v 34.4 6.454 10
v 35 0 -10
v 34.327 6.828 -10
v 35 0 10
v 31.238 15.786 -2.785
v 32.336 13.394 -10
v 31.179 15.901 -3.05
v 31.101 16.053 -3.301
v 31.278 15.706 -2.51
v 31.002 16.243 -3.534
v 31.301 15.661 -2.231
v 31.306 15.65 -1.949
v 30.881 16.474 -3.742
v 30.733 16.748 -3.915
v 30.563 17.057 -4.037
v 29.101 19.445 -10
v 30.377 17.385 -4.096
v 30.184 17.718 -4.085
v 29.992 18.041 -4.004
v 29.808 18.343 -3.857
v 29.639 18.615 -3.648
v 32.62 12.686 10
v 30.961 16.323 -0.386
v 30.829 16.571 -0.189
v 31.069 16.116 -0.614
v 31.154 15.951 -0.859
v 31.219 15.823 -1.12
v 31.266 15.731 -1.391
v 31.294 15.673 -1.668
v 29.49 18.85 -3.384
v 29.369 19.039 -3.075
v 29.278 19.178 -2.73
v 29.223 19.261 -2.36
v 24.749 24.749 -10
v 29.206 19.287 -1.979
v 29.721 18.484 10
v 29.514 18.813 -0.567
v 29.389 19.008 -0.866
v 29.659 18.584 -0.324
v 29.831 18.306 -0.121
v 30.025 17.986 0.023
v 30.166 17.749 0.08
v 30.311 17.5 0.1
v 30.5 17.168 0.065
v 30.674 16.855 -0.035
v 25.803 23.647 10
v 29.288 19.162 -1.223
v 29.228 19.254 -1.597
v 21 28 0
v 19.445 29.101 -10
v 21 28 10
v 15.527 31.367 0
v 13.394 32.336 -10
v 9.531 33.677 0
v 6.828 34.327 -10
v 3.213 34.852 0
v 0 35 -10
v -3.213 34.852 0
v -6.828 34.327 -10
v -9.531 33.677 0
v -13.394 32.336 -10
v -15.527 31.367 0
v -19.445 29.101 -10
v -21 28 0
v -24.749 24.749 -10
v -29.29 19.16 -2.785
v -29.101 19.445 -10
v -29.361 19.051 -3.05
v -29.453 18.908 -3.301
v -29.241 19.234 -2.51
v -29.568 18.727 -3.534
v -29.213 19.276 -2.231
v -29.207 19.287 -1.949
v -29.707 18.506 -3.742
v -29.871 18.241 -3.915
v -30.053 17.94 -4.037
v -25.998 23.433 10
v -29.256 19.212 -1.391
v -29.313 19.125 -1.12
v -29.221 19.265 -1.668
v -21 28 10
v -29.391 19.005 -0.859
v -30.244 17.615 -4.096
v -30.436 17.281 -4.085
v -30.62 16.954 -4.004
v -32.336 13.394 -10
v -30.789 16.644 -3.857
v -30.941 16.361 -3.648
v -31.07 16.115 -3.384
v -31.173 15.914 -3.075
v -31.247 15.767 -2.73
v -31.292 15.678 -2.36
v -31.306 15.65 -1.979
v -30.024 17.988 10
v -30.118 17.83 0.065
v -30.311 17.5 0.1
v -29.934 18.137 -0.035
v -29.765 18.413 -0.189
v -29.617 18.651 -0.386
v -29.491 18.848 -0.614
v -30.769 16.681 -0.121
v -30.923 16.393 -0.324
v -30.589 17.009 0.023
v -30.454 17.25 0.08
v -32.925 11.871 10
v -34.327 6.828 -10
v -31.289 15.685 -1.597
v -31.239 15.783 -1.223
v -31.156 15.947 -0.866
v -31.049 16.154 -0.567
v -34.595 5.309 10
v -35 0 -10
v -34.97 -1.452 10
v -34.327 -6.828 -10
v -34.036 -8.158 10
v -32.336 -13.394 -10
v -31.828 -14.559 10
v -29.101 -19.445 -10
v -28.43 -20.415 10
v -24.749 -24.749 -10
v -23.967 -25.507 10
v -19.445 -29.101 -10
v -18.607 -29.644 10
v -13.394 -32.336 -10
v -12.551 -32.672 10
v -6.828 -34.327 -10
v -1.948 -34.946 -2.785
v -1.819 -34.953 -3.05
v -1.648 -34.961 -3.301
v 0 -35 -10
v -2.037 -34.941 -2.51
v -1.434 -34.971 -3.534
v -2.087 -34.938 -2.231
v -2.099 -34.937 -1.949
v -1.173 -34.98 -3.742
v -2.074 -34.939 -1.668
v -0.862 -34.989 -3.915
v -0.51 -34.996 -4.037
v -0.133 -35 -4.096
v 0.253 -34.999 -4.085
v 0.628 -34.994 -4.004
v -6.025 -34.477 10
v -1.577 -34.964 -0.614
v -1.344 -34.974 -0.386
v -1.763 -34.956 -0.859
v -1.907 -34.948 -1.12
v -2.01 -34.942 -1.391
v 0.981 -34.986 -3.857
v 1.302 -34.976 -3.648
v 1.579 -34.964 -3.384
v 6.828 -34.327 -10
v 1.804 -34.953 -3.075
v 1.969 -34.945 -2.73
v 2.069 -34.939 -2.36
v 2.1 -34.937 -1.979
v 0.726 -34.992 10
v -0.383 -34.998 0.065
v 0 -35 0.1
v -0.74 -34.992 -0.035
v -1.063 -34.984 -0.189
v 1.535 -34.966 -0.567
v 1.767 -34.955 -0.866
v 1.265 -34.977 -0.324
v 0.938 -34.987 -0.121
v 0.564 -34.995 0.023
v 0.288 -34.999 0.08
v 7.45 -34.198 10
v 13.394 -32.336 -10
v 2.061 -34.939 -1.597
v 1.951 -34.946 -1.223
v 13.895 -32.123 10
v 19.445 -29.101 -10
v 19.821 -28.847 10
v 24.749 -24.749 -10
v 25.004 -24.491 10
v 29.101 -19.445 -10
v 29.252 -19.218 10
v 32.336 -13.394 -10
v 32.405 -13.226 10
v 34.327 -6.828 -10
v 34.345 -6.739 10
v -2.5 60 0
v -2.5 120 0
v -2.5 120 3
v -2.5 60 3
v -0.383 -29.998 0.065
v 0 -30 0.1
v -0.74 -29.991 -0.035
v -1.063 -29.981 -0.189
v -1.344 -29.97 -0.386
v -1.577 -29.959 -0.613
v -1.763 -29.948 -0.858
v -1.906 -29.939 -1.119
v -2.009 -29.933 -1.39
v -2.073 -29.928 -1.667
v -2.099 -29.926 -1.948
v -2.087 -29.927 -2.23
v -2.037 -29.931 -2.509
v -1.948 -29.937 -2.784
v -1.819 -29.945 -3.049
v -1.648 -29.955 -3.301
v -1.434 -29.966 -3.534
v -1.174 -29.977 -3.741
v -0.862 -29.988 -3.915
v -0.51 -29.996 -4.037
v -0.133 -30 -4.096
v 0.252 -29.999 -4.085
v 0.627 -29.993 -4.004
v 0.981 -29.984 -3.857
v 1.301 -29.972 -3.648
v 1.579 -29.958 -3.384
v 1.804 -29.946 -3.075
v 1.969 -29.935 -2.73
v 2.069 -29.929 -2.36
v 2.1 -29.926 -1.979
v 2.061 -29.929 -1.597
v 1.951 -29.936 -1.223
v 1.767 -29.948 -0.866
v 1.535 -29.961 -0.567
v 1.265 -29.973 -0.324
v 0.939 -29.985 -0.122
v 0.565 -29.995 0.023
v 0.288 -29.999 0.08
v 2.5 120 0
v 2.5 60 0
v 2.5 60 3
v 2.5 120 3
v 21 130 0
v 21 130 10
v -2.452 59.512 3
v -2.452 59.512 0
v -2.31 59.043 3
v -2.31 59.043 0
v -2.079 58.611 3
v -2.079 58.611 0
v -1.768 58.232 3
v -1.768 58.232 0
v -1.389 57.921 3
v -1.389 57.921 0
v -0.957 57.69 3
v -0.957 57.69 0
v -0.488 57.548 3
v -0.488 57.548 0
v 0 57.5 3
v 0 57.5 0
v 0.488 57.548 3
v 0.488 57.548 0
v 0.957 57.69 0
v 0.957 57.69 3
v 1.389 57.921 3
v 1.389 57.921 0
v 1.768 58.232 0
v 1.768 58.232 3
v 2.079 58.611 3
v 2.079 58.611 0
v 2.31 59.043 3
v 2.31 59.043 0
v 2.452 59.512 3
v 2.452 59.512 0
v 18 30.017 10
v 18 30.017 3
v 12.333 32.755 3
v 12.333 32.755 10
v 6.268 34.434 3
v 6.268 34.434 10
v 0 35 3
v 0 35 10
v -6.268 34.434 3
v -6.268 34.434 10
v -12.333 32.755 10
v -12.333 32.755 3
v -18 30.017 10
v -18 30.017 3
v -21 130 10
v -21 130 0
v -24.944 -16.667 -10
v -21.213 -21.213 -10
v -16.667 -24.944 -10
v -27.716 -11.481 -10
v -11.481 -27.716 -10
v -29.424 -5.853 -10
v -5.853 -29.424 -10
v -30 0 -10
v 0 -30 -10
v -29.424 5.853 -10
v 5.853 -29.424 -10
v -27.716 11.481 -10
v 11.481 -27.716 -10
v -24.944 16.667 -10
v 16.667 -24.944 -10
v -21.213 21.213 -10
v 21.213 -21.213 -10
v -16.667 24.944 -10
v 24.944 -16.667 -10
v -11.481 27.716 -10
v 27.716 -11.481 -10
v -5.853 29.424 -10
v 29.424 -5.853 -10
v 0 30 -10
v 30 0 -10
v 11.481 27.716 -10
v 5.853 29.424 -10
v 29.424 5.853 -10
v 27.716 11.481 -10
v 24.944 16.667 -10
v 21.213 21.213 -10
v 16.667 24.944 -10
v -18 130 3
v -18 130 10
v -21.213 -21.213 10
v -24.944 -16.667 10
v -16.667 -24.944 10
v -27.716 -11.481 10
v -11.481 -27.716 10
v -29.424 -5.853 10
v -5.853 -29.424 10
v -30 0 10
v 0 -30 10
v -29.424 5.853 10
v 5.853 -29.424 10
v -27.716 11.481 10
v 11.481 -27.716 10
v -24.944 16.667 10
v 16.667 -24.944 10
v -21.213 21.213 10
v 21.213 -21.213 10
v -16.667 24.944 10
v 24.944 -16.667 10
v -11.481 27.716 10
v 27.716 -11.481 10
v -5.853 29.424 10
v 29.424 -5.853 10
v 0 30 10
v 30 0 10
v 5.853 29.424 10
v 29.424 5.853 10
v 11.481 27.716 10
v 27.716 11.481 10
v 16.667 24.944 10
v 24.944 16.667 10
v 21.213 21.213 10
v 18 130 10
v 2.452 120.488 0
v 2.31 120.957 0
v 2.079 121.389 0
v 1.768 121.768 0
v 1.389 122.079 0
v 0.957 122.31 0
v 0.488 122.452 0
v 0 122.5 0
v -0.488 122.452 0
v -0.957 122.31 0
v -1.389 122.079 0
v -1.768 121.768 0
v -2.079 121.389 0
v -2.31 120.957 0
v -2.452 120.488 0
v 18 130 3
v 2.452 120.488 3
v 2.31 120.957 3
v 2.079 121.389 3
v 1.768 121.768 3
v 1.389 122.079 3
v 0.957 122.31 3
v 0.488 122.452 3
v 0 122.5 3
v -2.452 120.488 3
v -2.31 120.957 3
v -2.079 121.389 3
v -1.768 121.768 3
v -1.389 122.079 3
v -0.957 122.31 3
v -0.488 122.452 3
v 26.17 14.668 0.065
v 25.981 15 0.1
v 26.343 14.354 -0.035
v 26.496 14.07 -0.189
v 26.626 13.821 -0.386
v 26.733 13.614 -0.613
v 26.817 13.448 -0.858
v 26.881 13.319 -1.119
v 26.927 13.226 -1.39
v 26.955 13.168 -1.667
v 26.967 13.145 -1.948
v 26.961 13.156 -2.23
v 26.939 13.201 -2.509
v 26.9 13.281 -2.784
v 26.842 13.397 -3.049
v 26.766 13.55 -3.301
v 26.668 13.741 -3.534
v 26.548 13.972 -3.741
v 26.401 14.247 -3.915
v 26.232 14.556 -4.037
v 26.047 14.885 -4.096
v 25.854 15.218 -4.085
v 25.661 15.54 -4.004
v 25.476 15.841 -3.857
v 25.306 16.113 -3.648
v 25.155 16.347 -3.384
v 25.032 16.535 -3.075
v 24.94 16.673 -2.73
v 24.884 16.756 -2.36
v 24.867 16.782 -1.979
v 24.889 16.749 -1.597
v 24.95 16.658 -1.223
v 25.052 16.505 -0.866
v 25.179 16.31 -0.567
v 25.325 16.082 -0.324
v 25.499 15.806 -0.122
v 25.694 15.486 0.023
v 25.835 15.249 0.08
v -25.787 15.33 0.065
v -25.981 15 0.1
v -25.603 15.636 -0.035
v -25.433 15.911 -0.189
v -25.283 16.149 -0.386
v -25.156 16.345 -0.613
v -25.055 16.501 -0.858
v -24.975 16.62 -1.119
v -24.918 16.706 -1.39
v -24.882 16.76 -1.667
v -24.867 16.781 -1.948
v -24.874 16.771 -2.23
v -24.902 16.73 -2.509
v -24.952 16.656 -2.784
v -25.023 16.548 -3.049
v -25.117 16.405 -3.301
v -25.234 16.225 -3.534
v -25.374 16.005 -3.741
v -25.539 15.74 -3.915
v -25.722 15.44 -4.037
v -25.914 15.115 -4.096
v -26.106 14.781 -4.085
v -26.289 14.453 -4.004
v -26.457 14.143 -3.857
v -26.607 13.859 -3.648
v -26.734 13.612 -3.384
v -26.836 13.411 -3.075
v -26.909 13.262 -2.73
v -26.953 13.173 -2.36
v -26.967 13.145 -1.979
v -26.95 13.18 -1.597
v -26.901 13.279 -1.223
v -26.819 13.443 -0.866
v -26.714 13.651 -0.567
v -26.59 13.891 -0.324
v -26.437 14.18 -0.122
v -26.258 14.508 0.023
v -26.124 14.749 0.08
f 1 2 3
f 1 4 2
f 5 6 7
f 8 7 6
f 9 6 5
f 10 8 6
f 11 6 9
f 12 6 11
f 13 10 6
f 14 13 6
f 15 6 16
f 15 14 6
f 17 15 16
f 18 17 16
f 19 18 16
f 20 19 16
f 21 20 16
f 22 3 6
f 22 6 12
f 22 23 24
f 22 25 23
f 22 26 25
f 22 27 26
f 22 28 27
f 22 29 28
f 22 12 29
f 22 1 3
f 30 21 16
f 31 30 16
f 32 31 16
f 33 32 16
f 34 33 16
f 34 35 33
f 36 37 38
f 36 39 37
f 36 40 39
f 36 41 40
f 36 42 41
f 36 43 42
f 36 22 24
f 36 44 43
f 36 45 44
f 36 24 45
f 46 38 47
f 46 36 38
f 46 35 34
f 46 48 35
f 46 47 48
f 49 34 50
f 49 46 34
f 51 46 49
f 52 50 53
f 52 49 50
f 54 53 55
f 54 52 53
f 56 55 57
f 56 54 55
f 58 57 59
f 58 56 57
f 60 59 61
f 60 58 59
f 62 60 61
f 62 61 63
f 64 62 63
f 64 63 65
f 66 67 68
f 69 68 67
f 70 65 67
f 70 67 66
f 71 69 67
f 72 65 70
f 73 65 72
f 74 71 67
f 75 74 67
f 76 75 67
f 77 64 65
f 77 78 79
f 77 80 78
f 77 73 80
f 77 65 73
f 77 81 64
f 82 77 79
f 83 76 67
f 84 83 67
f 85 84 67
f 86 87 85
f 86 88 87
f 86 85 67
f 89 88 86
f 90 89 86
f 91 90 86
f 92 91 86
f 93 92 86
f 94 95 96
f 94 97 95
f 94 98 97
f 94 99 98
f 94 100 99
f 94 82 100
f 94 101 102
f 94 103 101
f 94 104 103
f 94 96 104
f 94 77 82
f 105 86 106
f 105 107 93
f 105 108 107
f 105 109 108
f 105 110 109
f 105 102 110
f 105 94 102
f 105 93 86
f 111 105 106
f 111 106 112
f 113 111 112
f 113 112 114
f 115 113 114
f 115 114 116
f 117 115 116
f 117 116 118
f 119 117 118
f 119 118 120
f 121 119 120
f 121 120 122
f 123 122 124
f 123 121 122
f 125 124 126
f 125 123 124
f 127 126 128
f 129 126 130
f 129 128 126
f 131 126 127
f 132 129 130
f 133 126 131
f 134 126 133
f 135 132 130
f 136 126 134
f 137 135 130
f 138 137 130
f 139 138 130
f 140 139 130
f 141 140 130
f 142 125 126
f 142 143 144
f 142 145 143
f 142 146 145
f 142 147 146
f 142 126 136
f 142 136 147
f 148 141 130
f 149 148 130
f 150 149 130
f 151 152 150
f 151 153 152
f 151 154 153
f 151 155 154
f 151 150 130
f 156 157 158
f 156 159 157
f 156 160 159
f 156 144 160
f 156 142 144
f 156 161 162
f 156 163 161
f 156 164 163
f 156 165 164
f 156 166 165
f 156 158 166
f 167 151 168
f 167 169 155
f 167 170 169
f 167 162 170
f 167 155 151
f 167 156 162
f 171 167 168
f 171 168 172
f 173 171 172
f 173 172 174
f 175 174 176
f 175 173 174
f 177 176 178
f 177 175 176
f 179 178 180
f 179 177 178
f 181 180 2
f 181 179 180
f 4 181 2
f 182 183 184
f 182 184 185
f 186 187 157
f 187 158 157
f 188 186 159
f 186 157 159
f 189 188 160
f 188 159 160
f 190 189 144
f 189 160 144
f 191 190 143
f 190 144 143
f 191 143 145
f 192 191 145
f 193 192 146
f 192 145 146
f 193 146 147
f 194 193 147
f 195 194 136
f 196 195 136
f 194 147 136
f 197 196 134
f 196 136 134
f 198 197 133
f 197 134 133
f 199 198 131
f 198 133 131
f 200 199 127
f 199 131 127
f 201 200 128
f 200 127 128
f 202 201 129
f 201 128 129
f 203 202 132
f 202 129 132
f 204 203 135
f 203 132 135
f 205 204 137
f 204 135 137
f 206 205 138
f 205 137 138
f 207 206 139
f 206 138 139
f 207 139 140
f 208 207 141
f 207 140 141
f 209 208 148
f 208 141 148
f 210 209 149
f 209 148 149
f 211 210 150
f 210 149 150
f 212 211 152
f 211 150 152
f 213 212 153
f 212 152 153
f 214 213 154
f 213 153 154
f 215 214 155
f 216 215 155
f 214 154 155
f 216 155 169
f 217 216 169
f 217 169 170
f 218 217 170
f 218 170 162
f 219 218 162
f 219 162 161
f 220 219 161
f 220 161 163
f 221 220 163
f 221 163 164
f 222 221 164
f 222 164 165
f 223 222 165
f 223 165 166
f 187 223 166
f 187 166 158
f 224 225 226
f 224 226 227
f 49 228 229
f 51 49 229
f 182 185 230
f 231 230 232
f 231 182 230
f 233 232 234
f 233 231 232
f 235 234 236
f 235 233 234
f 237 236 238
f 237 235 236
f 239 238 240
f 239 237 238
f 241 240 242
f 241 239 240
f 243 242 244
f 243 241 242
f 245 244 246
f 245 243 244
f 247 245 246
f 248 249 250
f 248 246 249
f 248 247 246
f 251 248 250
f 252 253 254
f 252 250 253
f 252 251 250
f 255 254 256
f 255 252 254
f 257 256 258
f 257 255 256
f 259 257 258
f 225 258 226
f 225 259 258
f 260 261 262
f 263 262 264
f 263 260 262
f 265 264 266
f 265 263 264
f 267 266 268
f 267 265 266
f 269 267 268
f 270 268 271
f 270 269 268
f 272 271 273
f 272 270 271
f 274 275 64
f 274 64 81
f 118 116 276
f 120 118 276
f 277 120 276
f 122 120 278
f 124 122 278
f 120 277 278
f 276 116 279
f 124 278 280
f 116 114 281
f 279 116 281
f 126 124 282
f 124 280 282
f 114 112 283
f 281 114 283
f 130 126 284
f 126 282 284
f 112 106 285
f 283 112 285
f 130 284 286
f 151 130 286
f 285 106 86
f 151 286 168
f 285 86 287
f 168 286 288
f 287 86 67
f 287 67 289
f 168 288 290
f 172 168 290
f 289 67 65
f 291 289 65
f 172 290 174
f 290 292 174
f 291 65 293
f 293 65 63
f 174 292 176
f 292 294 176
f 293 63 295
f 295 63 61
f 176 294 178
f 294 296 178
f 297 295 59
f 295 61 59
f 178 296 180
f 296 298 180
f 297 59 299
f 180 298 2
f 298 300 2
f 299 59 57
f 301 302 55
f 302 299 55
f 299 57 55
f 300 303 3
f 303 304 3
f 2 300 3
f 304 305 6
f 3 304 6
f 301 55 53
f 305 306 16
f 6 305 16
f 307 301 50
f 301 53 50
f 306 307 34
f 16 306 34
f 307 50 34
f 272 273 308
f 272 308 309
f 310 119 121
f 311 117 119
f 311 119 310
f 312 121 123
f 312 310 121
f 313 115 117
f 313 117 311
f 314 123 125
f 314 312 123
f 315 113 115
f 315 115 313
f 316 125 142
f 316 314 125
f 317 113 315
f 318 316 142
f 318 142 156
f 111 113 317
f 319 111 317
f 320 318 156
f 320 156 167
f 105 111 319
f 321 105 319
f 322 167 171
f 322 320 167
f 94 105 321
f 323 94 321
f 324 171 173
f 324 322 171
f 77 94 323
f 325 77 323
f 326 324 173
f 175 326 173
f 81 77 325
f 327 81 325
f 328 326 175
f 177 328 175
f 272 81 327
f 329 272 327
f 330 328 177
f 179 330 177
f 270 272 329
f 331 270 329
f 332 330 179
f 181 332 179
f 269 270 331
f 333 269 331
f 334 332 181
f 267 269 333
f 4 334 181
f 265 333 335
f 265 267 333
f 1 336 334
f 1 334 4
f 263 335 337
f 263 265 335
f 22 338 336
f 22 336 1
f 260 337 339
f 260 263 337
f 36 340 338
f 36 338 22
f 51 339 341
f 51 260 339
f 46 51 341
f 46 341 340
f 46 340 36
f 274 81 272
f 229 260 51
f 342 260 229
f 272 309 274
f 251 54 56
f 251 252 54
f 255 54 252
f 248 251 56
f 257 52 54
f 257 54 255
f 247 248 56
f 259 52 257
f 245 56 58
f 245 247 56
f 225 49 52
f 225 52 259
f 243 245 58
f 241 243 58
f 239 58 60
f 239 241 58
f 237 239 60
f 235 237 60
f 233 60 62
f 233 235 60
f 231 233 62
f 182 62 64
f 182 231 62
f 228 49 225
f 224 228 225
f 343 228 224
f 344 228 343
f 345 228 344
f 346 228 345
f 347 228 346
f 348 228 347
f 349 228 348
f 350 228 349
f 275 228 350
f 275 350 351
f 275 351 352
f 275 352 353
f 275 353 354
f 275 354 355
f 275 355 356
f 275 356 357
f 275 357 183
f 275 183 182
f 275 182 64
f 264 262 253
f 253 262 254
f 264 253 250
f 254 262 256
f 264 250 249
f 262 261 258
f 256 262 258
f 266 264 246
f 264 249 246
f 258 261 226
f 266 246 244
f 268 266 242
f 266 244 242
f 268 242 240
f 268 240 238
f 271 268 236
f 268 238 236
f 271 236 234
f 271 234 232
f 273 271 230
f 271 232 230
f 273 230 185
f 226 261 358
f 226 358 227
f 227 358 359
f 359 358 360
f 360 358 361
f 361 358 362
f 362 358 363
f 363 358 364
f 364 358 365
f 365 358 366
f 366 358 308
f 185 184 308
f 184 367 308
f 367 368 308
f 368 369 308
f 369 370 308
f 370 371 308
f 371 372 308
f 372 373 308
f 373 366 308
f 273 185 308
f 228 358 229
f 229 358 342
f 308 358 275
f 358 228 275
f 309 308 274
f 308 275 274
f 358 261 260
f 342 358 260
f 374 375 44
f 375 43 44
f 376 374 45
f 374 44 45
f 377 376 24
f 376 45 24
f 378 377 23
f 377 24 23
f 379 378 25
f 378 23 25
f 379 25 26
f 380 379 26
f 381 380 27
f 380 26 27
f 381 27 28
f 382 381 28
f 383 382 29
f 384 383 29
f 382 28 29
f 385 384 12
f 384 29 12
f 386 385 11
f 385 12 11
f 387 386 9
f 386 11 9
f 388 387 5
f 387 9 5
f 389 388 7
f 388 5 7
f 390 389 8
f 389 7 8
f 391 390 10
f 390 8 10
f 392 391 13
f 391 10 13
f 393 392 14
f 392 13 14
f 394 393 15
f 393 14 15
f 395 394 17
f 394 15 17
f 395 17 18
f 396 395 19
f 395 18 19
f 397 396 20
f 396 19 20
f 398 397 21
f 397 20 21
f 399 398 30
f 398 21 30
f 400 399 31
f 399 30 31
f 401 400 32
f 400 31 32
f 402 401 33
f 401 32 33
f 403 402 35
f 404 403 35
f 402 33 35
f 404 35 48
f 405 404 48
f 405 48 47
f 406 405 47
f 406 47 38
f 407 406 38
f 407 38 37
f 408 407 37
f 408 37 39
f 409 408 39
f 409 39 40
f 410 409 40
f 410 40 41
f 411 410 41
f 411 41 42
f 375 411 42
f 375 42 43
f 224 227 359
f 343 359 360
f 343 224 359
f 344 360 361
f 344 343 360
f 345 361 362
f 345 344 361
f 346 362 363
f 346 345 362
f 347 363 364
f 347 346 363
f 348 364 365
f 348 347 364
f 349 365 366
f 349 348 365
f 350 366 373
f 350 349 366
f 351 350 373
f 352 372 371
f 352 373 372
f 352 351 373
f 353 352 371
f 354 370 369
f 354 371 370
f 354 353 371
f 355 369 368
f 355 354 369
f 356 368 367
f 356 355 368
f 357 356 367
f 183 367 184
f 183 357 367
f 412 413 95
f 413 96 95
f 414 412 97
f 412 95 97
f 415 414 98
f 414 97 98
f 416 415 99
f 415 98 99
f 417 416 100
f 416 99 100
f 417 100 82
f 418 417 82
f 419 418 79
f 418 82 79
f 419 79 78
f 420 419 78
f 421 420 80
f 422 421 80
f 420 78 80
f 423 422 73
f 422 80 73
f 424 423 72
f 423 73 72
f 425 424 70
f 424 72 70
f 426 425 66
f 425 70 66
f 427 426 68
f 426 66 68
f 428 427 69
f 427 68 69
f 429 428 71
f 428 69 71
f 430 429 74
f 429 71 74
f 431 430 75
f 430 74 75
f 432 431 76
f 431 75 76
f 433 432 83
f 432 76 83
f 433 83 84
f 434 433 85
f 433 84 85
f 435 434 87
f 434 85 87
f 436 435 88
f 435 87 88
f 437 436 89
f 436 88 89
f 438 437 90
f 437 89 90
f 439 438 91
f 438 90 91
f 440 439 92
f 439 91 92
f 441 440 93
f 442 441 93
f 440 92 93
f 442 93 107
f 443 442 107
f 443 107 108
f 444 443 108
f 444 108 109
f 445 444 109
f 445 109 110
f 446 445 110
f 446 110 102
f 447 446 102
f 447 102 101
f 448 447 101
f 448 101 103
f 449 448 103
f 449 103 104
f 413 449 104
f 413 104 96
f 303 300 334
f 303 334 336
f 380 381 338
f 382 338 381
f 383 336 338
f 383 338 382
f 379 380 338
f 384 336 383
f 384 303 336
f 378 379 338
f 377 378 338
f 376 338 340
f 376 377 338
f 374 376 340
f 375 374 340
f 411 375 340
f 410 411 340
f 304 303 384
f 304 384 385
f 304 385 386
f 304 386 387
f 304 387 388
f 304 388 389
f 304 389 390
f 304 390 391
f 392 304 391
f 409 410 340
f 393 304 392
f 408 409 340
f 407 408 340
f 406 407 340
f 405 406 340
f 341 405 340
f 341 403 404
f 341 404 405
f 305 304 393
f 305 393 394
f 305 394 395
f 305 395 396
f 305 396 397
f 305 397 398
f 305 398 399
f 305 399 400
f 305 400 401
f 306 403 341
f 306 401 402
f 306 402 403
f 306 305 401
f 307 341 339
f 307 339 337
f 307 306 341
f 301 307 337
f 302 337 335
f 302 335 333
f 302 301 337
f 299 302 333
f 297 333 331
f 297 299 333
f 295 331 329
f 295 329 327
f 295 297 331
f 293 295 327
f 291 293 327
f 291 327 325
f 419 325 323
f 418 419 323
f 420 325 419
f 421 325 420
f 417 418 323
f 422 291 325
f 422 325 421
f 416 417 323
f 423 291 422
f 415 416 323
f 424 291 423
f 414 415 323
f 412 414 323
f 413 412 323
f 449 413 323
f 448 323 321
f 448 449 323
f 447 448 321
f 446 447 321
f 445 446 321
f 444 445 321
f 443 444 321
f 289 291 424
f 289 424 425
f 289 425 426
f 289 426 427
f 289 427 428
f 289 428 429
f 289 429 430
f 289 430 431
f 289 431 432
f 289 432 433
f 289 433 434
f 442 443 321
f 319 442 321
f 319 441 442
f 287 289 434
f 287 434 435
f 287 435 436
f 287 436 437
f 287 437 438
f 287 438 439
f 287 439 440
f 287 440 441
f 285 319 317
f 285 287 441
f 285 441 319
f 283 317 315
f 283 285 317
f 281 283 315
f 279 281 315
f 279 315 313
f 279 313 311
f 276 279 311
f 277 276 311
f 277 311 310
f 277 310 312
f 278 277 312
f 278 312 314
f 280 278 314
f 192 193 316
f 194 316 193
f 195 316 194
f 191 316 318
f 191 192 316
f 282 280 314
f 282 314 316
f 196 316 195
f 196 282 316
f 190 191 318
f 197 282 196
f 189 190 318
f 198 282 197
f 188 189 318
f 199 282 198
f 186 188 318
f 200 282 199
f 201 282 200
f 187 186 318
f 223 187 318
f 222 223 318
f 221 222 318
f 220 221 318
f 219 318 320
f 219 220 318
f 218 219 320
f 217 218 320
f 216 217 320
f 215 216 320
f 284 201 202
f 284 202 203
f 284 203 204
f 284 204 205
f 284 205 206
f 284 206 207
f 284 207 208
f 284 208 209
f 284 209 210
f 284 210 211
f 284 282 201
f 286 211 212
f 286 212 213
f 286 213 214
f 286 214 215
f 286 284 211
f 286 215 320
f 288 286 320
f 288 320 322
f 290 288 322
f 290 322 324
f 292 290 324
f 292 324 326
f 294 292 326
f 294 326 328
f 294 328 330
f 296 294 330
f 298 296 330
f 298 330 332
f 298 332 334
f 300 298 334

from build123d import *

# Parameters (mm, degrees)
SKETCH1_R           = 35
SKETCH1_R_2         = 30
BOSS_EXTRUDE1_DEPTH = 10
BOSS_EXTRUDE2_START = 3
BOSS_EXTRUDE2_DEPTH = 3
SKETCH3_W           = 10
SKETCH3_H           = 102
BOSS_EXTRUDE3_DEPTH = 3
SKETCH6_W           = 2.1
SKETCH6_H           = 95.310889132
CIRPATTERN1_COUNT   = 3
CUT_EXTRUDE1_REACH  = 137


with BuildPart() as part:
    # Sketch1 → Boss-Extrude1 (new, symmetric)
    with BuildSketch(Plane.XY):
        Circle(SKETCH1_R)
        Circle(SKETCH1_R_2, mode=Mode.SUBTRACT)
    extrude(amount=BOSS_EXTRUDE1_DEPTH, both=True)

    # Sketch2 → Boss-Extrude2 (add)
    with BuildSketch(Plane.XY.offset(BOSS_EXTRUDE2_START)):
        with BuildLine():
            Line((-21, 130), (21, 130))
            Line((21, 130), (21, 28))
            ThreePointArc((21, 28), (0, 35), (-21, 28))
            Line((-21, 28), (-21, 130))
        make_face()
    extrude(amount=-BOSS_EXTRUDE2_DEPTH)

    # Sketch3 → Boss-Extrude3 (add)
    with BuildSketch(Plane.ZY.offset(21)):
        with Locations((5, 79)):
            Rectangle(SKETCH3_W, SKETCH3_H)
    boss_extrude3 = extrude(amount=-BOSS_EXTRUDE3_DEPTH)

    # Mirror1: Boss-Extrude3 across plane
    add(boss_extrude3.mirror(Plane(origin=(0, 0, 0), x_dir=(0, 0, 1), z_dir=(1, 0, 0))))

    # Sketch6 → M5x0.8 Tapped Hole1 (revolve, cut)
    with BuildSketch(Plane(origin=(0, 0, -2), x_dir=(0, 0, 1), z_dir=(1, 0, 0))):
        with Locations((1.05, 47.655444566)):
            Rectangle(SKETCH6_W, SKETCH6_H)
    m5x0_8_tapped_hole1 = revolve(axis=Axis((0, 6.35, -2), (0, -1, 0)), mode=Mode.SUBTRACT)

    # CirPattern1: M5x0.8 Tapped Hole1 ×3 about axis
    cirpattern1_axis = Axis((0, 0, 10), (0, 0, -1))
    for i in range(1, CIRPATTERN1_COUNT):
        add(m5x0_8_tapped_hole1.rotate(cirpattern1_axis, i * 360 / CIRPATTERN1_COUNT), mode=Mode.SUBTRACT)

    # Sketch7 → Cut-Extrude1 (cut, up to next)
    with BuildSketch(Plane(origin=(0, 0, 0), x_dir=(-1, 0, 0), z_dir=(0, 0, -1)), mode=Mode.PRIVATE) as cut_extrude1_sk1:
        with BuildLine():
            Line((2.5, 120), (2.5, 60))
            ThreePointArc((2.5, 60), (0, 57.5), (-2.5, 60))
            Line((-2.5, 60), (-2.5, 120))
            ThreePointArc((-2.5, 120), (0, 122.5), (2.5, 120))
        make_face()
    cut_extrude1_tool1 = extrude(cut_extrude1_sk1.sketch, amount=-CUT_EXTRUDE1_REACH, mode=Mode.PRIVATE) & part.part
    add(cut_extrude1_tool1.solids().sort_by_distance((0, 90, 0))[0], mode=Mode.SUBTRACT)


solid = part.part
